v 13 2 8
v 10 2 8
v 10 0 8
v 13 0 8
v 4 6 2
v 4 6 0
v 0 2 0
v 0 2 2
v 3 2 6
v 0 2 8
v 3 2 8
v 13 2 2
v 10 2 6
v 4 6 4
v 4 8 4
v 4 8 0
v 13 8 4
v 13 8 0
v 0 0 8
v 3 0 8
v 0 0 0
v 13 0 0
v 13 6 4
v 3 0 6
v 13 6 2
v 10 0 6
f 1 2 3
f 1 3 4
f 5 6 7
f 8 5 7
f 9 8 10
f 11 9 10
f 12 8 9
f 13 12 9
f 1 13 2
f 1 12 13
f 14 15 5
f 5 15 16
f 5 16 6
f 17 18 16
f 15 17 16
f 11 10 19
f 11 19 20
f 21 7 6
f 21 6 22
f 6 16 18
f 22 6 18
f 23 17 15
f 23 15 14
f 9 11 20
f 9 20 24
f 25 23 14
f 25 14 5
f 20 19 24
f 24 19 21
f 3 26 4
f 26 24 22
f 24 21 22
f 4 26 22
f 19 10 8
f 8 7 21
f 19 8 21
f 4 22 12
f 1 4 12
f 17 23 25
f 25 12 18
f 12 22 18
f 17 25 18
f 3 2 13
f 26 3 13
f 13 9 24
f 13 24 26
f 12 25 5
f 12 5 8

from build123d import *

# Parameters (mm, degrees)
BOSS_EXTRUDE1_DEPTH = 8
CUT_EXTRUDE1_DEPTH  = 18
SKETCH3_W           = 7
SKETCH3_H           = 2
CUT_EXTRUDE2_DEPTH  = 2


with BuildPart() as part:
    # Sketch1 → Boss-Extrude1 (new body)
    with BuildSketch(Plane.XY):
        Polygon((0, 0), (13, 0), (13, 8), (4, 8), (4, 6), (0, 2), align=None)
    extrude(amount=BOSS_EXTRUDE1_DEPTH)

    # Sketch2 → Cut-Extrude1 (cut)
    with BuildSketch(Plane(origin=(13, 0, 0), x_dir=(0, 0, -1), z_dir=(1, 0, 0))):
        Polygon((-8, 8), (-4, 8), (-4, 6), (-2, 6), (-2, 2), (-8, 2), (-8, 6), align=None)
    extrude(amount=-CUT_EXTRUDE1_DEPTH, mode=Mode.SUBTRACT)

    # Sketch3 → Cut-Extrude2 (cut)
    with BuildSketch(Plane(origin=(0, 2, 0), x_dir=(1, 0, 0), z_dir=(0, 1, 0))):
        with Locations((6.5, -7)):
            Rectangle(SKETCH3_W, SKETCH3_H)
    extrude(amount=-CUT_EXTRUDE2_DEPTH, mode=Mode.SUBTRACT)


solid = part.part
